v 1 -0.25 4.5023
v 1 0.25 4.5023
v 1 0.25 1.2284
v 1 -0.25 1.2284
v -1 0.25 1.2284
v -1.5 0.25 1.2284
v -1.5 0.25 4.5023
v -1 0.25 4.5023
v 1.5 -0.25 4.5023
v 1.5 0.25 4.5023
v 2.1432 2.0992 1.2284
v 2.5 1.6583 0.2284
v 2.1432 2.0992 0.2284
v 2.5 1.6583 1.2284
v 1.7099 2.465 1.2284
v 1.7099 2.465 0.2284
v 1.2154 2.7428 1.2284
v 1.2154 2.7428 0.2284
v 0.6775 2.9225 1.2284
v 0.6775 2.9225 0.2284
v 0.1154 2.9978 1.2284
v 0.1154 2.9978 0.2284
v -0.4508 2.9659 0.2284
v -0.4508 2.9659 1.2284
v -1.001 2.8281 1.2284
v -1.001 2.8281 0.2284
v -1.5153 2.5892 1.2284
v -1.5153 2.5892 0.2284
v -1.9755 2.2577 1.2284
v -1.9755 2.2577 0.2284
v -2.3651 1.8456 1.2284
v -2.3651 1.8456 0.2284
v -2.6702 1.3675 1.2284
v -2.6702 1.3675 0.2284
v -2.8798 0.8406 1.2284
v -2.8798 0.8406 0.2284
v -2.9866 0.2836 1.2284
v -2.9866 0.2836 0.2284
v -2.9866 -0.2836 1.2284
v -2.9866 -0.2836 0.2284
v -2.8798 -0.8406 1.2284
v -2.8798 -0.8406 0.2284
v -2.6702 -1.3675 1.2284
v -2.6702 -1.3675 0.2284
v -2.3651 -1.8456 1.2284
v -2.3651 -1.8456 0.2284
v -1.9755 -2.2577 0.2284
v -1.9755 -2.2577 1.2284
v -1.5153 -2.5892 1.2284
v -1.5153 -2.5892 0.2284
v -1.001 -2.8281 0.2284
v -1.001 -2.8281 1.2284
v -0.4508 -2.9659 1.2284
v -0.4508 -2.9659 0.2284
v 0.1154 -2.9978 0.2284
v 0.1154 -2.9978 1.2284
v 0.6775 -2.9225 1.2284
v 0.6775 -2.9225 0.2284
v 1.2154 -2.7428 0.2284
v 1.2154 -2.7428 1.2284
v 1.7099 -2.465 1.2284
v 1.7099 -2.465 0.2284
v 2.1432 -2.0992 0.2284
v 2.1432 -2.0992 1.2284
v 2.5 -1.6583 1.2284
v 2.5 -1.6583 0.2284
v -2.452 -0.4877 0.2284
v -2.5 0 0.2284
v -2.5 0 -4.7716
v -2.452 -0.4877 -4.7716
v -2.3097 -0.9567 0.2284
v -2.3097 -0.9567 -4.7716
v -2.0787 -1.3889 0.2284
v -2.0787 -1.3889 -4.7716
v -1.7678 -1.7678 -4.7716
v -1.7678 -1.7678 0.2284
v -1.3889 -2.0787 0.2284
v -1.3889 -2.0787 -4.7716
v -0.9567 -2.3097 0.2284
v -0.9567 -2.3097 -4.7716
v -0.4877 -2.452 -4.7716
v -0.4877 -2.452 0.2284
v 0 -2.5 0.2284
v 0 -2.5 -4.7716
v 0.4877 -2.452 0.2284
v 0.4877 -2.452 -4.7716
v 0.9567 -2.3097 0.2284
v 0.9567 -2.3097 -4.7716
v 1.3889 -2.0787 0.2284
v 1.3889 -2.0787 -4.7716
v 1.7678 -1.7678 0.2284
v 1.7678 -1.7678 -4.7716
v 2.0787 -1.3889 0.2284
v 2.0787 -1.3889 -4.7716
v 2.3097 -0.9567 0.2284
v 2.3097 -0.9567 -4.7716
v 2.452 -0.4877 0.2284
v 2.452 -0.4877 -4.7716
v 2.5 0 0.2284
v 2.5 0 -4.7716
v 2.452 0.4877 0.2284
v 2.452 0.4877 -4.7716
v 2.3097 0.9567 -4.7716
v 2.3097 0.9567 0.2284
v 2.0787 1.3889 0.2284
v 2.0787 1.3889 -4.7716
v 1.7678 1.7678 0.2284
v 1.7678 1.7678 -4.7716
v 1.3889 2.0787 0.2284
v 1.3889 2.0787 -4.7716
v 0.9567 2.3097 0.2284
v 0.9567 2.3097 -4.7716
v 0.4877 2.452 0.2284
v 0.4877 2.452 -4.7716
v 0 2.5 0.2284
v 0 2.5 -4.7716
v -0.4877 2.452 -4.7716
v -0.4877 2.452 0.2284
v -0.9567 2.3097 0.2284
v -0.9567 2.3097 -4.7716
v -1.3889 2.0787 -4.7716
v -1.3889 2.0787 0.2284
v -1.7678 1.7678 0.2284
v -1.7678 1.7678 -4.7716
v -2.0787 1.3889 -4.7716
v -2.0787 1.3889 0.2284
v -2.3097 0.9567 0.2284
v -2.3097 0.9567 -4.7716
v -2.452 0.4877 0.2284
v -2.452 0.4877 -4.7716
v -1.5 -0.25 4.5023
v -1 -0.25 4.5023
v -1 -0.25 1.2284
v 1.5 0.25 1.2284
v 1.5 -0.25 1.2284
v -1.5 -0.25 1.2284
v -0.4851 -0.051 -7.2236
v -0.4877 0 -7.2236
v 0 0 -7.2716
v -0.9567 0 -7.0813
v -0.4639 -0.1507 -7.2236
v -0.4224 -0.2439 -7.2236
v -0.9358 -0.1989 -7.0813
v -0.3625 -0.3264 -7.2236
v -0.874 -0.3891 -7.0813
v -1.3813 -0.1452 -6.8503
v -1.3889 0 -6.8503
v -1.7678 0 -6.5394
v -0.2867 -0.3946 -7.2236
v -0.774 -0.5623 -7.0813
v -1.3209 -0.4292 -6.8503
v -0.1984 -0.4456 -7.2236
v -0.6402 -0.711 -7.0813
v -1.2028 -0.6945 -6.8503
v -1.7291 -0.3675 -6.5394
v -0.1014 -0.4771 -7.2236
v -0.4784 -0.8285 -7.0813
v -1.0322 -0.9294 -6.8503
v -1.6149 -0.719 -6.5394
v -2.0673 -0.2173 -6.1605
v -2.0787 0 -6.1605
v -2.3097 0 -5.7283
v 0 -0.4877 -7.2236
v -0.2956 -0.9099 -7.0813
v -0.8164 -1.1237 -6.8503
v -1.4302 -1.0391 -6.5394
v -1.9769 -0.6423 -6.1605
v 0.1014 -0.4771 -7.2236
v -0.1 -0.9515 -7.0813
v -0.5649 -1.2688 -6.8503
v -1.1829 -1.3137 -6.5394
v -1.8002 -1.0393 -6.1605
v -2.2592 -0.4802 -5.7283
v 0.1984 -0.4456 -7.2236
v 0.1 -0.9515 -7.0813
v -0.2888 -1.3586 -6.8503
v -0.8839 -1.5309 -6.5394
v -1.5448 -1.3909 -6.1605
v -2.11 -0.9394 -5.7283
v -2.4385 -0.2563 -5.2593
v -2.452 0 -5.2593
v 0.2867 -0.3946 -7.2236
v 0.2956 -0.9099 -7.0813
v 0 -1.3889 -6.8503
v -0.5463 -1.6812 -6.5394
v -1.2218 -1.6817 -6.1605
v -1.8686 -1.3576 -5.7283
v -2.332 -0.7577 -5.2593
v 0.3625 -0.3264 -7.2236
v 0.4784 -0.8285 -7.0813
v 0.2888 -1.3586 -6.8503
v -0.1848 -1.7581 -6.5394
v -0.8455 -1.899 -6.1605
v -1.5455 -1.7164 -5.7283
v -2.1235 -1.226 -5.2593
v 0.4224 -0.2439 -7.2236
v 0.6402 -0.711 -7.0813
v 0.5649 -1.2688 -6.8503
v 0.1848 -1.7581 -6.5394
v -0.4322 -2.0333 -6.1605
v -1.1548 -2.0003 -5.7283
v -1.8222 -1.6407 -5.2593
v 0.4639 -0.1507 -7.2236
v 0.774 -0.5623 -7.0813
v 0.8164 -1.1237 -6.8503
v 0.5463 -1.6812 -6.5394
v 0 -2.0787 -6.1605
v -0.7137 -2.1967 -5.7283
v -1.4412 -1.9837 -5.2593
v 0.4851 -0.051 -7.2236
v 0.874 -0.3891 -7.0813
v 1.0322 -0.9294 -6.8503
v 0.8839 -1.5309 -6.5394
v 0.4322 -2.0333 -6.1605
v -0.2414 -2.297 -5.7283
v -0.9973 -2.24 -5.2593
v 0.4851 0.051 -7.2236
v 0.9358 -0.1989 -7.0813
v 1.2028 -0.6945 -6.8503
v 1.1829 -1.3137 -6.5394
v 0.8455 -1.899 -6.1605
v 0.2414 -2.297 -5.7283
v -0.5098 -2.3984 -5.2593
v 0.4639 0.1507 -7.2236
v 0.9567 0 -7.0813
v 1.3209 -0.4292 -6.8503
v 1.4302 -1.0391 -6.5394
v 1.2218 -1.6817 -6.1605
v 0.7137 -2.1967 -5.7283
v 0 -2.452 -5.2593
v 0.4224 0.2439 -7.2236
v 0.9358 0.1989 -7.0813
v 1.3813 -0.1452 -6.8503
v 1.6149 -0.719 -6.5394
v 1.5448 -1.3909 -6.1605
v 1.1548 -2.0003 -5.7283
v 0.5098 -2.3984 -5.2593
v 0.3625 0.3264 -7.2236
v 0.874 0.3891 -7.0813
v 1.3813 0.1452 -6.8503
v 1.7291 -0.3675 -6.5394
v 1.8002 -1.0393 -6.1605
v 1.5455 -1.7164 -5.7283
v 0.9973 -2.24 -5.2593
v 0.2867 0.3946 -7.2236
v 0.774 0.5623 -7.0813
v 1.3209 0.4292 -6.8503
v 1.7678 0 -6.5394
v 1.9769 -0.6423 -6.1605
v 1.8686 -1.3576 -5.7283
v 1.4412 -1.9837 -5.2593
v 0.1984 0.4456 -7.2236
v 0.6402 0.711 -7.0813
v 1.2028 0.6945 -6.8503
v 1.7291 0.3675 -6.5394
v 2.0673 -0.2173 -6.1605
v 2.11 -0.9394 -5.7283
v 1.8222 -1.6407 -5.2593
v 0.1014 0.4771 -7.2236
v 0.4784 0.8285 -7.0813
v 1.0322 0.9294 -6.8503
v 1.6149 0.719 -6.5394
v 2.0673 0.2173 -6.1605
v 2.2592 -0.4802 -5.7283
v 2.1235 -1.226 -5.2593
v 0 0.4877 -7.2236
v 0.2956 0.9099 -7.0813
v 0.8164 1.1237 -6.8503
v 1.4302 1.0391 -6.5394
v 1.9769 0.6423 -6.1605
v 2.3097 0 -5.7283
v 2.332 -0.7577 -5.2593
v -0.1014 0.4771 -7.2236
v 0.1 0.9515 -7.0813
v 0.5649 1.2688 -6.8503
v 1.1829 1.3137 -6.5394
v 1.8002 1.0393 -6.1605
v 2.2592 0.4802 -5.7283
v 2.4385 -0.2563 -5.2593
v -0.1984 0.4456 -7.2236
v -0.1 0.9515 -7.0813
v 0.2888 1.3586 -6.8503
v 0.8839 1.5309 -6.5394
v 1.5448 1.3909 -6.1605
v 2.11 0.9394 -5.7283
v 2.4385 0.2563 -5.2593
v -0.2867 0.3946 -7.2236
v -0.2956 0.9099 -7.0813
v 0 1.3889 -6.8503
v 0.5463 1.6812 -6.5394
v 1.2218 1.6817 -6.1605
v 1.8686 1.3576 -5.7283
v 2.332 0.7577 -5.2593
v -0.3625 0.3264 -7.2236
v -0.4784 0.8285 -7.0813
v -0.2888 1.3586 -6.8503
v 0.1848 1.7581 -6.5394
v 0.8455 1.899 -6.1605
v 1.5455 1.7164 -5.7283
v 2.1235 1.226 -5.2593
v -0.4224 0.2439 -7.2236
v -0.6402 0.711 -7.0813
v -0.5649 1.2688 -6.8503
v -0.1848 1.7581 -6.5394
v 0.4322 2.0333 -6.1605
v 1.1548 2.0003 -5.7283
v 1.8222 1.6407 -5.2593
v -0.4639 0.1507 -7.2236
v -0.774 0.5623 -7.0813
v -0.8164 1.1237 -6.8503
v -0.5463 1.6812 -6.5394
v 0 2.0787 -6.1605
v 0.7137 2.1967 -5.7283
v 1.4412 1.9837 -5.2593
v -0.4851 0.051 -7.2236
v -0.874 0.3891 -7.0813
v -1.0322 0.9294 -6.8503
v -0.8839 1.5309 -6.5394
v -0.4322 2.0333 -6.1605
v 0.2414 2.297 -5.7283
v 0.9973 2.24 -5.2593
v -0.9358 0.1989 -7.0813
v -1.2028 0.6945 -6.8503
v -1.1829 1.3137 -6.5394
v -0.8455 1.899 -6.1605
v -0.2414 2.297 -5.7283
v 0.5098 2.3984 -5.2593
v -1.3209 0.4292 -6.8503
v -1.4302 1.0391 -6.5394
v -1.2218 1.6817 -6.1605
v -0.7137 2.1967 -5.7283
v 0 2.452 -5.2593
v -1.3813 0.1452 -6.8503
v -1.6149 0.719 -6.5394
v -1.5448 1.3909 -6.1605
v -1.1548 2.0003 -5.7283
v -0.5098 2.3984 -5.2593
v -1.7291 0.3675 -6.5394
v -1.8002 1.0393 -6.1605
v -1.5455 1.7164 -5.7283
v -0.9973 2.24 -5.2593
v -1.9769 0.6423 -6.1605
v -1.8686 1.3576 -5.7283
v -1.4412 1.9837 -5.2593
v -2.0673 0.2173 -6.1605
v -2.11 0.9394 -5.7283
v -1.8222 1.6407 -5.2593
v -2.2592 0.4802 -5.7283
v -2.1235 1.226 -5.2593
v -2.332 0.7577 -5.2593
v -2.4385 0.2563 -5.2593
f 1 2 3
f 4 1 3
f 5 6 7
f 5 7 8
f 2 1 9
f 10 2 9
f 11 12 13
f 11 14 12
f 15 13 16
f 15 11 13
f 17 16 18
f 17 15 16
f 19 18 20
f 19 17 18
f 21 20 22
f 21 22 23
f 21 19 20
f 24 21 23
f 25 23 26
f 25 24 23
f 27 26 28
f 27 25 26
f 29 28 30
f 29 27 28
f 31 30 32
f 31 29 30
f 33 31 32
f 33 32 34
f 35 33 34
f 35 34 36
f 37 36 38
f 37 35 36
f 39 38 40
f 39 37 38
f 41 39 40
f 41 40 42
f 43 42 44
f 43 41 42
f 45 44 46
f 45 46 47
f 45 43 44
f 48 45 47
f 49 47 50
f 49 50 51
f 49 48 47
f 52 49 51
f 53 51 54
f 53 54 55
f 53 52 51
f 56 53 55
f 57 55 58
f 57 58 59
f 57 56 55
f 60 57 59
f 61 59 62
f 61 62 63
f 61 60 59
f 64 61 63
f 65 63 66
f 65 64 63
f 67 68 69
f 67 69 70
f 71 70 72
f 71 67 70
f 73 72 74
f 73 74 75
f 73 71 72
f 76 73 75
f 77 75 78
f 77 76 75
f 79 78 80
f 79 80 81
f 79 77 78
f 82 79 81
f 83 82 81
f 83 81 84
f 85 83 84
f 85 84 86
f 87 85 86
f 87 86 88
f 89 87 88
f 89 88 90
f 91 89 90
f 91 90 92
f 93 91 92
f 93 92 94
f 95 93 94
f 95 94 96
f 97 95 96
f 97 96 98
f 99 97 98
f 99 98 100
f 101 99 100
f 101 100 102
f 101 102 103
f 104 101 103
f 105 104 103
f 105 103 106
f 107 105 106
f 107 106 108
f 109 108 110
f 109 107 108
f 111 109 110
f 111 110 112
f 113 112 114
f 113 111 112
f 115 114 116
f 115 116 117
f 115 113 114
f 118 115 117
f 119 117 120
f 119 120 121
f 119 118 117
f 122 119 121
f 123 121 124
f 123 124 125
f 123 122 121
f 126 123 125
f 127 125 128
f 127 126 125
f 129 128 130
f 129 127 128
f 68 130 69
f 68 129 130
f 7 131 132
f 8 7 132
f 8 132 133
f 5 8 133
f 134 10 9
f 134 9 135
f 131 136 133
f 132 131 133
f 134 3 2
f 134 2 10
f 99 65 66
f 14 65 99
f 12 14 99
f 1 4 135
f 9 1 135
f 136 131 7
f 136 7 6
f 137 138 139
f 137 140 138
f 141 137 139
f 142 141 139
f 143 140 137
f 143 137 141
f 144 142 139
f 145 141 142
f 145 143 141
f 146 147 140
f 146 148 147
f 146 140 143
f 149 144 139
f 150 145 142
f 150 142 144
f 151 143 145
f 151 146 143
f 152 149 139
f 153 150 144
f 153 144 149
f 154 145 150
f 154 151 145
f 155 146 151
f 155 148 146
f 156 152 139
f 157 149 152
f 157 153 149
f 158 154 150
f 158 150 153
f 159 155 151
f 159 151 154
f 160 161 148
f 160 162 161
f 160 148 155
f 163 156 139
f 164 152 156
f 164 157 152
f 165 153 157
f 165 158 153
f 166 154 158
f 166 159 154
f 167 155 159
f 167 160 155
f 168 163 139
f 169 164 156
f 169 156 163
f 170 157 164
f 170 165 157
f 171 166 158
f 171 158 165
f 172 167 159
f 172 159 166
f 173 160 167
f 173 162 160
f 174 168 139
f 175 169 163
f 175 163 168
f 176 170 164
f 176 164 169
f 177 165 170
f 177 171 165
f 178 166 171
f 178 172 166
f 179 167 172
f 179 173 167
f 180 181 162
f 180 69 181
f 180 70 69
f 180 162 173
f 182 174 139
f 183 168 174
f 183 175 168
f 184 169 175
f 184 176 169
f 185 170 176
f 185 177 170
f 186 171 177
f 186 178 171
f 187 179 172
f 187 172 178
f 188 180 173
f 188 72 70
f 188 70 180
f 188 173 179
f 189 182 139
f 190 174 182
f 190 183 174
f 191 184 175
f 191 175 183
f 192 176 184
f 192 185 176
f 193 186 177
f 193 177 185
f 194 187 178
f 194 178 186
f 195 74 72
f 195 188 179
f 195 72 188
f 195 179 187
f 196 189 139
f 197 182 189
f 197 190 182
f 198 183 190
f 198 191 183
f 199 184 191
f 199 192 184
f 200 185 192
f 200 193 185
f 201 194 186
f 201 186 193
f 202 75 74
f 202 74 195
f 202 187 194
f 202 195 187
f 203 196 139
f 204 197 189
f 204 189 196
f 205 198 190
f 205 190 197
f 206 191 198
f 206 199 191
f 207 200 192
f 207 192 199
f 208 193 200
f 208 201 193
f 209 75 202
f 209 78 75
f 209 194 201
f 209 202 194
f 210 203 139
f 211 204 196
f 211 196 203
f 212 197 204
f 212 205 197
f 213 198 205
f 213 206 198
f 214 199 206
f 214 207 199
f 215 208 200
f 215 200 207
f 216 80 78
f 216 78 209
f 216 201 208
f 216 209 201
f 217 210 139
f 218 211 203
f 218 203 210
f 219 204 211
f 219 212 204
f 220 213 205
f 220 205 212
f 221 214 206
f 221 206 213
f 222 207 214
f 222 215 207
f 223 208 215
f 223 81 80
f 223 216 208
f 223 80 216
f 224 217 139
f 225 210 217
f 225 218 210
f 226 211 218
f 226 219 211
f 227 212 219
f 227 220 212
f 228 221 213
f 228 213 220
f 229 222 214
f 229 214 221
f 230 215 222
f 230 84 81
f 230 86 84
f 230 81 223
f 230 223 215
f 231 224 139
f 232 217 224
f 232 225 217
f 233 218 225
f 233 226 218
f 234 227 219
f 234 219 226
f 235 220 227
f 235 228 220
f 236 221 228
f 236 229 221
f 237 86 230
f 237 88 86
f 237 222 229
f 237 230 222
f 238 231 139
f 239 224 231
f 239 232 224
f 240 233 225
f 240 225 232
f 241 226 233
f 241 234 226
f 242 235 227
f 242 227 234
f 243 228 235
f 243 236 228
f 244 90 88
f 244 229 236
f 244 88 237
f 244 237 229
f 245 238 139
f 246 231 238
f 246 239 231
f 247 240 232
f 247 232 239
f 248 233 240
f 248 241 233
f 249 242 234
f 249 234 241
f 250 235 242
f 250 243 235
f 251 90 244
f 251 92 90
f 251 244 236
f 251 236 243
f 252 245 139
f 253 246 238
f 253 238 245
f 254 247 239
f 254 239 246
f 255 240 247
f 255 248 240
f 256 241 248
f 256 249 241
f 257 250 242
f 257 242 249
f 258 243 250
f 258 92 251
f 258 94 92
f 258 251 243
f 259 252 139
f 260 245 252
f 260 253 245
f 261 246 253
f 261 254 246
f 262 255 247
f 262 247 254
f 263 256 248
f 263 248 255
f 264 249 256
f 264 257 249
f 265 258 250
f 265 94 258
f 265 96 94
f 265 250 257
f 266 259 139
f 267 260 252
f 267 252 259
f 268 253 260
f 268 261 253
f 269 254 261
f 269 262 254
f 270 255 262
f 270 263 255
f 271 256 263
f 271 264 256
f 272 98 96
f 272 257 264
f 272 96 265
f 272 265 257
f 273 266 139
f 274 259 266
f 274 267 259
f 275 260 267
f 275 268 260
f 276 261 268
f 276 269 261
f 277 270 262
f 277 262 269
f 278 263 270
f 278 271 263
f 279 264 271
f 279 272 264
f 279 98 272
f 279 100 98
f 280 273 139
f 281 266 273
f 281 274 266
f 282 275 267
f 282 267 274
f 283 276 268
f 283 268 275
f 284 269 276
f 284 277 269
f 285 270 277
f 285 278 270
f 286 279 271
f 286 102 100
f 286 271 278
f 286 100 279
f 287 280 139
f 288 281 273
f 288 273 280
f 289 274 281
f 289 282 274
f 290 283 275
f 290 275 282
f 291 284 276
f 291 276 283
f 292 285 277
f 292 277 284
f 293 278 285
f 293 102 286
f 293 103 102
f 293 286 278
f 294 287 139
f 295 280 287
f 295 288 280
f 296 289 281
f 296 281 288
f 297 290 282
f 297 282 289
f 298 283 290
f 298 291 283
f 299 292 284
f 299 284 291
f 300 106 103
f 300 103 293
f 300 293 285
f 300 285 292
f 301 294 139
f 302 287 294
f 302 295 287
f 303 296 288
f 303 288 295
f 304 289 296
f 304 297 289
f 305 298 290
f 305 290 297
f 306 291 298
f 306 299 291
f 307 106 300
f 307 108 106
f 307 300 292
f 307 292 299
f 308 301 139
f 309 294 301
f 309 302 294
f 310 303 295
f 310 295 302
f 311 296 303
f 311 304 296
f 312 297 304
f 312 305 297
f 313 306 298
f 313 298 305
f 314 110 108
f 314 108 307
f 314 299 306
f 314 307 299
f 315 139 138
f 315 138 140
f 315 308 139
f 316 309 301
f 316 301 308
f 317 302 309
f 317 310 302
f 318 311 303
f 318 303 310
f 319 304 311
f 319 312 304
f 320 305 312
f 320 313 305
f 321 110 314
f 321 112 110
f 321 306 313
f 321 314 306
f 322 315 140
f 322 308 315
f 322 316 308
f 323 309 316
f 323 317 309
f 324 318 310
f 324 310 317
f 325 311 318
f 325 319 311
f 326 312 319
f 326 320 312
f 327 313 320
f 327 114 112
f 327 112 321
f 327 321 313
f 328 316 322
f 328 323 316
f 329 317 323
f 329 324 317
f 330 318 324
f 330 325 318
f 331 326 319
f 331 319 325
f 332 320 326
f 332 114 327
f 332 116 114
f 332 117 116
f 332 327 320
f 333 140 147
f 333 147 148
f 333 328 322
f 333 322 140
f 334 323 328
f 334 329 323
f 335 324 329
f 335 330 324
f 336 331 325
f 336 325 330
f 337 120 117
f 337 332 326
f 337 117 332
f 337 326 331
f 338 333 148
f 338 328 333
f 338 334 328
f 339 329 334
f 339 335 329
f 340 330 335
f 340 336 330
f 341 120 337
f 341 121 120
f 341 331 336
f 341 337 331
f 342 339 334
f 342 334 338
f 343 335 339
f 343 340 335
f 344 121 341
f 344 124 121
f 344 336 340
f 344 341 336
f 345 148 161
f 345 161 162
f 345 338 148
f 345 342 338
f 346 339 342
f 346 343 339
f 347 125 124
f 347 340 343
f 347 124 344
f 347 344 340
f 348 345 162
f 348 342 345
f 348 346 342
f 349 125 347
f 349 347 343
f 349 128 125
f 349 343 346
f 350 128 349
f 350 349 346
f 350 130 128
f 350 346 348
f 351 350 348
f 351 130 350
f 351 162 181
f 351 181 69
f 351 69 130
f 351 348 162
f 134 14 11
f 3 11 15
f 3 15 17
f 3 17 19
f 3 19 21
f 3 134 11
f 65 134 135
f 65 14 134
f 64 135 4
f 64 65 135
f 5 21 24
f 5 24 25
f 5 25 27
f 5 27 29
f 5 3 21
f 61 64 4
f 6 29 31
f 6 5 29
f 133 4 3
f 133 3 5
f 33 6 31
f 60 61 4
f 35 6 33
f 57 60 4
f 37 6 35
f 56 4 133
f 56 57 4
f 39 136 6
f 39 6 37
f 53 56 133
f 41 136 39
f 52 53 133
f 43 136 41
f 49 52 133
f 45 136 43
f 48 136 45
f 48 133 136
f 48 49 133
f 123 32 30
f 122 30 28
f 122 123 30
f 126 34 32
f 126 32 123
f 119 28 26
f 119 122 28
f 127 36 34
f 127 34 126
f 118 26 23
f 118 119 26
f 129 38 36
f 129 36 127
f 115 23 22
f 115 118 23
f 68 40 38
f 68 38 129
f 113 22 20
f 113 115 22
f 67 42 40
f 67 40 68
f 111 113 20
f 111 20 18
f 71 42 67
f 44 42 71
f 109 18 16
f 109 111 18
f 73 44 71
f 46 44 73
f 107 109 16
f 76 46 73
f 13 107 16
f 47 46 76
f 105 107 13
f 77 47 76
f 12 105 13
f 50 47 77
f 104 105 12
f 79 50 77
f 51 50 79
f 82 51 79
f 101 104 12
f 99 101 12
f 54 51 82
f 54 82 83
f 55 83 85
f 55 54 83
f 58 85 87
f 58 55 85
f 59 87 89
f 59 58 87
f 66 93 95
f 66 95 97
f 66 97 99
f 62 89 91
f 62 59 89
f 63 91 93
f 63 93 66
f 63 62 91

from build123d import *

# Parameters (mm, degrees)
SKETCH5_W               = 0.5
SKETCH5_H               = 29
SKETCH5_H_2             = 27
BOSS_EXTRUDE1_DEPTH     = 0.25
SKETCH6_W               = 3.089069264
SKETCH6_H               = 11.690007215
CUT_EXTRUDE1_DEPTH      = 2.5
CUT_EXTRUDE2_DEPTH      = 30.534698967
CUT_EXTRUDE2_DEPTH_BACK = 30.534698967
SKETCH7_W               = 17.118012924
SKETCH7_H               = 27.873578567


with BuildPart() as part:
    # Sketch4 → Revolve1 (revolve)
    with BuildSketch(Plane(origin=(0, 0, 0), x_dir=(1, 0, 0), z_dir=(0, 1, 0))):
        with BuildLine():
            Line((-2.5, 4.771615798), (-2.5, -0.228384202))
            Line((-2.5, -0.228384202), (-3, -0.228384202))
            Line((-3, -0.228384202), (-3, -1.228384202))
            Line((-3, -1.228384202), (0, -1.228384202))
            Line((0, -1.228384202), (0, 7.271615798))
            ThreePointArc((0, 7.271615798), (-1.767766953, 6.539382751), (-2.5, 4.771615798))
        make_face()
    revolve(axis=Axis((0, 0, -8.02238806), (0, 0, 1)))

    # Sketch5 → Boss-Extrude1 (add, symmetric)
    with BuildSketch(Plane(origin=(0, 0, 0), x_dir=(1, 0, 0), z_dir=(0, 1, 0))):
        with Locations((-1.25, -14.728384202)):
            Rectangle(SKETCH5_W, SKETCH5_H)
        with Locations((1.25, -13.728384202)):
            Rectangle(SKETCH5_W, SKETCH5_H_2)
    extrude(amount=BOSS_EXTRUDE1_DEPTH, both=True)

    # Sketch6 → Cut-Extrude1 (cut, symmetric)
    with BuildSketch(Plane(origin=(0, 0, 0), x_dir=(1, 0, 0), z_dir=(0, 1, 0))):
        with Locations((4.044534632, -0.802626626)):
            Rectangle(SKETCH6_W, SKETCH6_H)
    extrude(amount=CUT_EXTRUDE1_DEPTH, both=True, mode=Mode.SUBTRACT)

    # Sketch7 → Cut-Extrude2 (cut, two sides: drawn at the far end of the back side and taken through both)
    with BuildSketch(Plane(origin=(0, 0, 0), x_dir=(1, 0, 0), z_dir=(0, 1, 0)).offset(-CUT_EXTRUDE2_DEPTH_BACK)):
        with Locations((0.81040788, -18.439111074)):
            Rectangle(SKETCH7_W, SKETCH7_H)
    extrude(amount=CUT_EXTRUDE2_DEPTH + CUT_EXTRUDE2_DEPTH_BACK, mode=Mode.SUBTRACT)


solid = part.part
